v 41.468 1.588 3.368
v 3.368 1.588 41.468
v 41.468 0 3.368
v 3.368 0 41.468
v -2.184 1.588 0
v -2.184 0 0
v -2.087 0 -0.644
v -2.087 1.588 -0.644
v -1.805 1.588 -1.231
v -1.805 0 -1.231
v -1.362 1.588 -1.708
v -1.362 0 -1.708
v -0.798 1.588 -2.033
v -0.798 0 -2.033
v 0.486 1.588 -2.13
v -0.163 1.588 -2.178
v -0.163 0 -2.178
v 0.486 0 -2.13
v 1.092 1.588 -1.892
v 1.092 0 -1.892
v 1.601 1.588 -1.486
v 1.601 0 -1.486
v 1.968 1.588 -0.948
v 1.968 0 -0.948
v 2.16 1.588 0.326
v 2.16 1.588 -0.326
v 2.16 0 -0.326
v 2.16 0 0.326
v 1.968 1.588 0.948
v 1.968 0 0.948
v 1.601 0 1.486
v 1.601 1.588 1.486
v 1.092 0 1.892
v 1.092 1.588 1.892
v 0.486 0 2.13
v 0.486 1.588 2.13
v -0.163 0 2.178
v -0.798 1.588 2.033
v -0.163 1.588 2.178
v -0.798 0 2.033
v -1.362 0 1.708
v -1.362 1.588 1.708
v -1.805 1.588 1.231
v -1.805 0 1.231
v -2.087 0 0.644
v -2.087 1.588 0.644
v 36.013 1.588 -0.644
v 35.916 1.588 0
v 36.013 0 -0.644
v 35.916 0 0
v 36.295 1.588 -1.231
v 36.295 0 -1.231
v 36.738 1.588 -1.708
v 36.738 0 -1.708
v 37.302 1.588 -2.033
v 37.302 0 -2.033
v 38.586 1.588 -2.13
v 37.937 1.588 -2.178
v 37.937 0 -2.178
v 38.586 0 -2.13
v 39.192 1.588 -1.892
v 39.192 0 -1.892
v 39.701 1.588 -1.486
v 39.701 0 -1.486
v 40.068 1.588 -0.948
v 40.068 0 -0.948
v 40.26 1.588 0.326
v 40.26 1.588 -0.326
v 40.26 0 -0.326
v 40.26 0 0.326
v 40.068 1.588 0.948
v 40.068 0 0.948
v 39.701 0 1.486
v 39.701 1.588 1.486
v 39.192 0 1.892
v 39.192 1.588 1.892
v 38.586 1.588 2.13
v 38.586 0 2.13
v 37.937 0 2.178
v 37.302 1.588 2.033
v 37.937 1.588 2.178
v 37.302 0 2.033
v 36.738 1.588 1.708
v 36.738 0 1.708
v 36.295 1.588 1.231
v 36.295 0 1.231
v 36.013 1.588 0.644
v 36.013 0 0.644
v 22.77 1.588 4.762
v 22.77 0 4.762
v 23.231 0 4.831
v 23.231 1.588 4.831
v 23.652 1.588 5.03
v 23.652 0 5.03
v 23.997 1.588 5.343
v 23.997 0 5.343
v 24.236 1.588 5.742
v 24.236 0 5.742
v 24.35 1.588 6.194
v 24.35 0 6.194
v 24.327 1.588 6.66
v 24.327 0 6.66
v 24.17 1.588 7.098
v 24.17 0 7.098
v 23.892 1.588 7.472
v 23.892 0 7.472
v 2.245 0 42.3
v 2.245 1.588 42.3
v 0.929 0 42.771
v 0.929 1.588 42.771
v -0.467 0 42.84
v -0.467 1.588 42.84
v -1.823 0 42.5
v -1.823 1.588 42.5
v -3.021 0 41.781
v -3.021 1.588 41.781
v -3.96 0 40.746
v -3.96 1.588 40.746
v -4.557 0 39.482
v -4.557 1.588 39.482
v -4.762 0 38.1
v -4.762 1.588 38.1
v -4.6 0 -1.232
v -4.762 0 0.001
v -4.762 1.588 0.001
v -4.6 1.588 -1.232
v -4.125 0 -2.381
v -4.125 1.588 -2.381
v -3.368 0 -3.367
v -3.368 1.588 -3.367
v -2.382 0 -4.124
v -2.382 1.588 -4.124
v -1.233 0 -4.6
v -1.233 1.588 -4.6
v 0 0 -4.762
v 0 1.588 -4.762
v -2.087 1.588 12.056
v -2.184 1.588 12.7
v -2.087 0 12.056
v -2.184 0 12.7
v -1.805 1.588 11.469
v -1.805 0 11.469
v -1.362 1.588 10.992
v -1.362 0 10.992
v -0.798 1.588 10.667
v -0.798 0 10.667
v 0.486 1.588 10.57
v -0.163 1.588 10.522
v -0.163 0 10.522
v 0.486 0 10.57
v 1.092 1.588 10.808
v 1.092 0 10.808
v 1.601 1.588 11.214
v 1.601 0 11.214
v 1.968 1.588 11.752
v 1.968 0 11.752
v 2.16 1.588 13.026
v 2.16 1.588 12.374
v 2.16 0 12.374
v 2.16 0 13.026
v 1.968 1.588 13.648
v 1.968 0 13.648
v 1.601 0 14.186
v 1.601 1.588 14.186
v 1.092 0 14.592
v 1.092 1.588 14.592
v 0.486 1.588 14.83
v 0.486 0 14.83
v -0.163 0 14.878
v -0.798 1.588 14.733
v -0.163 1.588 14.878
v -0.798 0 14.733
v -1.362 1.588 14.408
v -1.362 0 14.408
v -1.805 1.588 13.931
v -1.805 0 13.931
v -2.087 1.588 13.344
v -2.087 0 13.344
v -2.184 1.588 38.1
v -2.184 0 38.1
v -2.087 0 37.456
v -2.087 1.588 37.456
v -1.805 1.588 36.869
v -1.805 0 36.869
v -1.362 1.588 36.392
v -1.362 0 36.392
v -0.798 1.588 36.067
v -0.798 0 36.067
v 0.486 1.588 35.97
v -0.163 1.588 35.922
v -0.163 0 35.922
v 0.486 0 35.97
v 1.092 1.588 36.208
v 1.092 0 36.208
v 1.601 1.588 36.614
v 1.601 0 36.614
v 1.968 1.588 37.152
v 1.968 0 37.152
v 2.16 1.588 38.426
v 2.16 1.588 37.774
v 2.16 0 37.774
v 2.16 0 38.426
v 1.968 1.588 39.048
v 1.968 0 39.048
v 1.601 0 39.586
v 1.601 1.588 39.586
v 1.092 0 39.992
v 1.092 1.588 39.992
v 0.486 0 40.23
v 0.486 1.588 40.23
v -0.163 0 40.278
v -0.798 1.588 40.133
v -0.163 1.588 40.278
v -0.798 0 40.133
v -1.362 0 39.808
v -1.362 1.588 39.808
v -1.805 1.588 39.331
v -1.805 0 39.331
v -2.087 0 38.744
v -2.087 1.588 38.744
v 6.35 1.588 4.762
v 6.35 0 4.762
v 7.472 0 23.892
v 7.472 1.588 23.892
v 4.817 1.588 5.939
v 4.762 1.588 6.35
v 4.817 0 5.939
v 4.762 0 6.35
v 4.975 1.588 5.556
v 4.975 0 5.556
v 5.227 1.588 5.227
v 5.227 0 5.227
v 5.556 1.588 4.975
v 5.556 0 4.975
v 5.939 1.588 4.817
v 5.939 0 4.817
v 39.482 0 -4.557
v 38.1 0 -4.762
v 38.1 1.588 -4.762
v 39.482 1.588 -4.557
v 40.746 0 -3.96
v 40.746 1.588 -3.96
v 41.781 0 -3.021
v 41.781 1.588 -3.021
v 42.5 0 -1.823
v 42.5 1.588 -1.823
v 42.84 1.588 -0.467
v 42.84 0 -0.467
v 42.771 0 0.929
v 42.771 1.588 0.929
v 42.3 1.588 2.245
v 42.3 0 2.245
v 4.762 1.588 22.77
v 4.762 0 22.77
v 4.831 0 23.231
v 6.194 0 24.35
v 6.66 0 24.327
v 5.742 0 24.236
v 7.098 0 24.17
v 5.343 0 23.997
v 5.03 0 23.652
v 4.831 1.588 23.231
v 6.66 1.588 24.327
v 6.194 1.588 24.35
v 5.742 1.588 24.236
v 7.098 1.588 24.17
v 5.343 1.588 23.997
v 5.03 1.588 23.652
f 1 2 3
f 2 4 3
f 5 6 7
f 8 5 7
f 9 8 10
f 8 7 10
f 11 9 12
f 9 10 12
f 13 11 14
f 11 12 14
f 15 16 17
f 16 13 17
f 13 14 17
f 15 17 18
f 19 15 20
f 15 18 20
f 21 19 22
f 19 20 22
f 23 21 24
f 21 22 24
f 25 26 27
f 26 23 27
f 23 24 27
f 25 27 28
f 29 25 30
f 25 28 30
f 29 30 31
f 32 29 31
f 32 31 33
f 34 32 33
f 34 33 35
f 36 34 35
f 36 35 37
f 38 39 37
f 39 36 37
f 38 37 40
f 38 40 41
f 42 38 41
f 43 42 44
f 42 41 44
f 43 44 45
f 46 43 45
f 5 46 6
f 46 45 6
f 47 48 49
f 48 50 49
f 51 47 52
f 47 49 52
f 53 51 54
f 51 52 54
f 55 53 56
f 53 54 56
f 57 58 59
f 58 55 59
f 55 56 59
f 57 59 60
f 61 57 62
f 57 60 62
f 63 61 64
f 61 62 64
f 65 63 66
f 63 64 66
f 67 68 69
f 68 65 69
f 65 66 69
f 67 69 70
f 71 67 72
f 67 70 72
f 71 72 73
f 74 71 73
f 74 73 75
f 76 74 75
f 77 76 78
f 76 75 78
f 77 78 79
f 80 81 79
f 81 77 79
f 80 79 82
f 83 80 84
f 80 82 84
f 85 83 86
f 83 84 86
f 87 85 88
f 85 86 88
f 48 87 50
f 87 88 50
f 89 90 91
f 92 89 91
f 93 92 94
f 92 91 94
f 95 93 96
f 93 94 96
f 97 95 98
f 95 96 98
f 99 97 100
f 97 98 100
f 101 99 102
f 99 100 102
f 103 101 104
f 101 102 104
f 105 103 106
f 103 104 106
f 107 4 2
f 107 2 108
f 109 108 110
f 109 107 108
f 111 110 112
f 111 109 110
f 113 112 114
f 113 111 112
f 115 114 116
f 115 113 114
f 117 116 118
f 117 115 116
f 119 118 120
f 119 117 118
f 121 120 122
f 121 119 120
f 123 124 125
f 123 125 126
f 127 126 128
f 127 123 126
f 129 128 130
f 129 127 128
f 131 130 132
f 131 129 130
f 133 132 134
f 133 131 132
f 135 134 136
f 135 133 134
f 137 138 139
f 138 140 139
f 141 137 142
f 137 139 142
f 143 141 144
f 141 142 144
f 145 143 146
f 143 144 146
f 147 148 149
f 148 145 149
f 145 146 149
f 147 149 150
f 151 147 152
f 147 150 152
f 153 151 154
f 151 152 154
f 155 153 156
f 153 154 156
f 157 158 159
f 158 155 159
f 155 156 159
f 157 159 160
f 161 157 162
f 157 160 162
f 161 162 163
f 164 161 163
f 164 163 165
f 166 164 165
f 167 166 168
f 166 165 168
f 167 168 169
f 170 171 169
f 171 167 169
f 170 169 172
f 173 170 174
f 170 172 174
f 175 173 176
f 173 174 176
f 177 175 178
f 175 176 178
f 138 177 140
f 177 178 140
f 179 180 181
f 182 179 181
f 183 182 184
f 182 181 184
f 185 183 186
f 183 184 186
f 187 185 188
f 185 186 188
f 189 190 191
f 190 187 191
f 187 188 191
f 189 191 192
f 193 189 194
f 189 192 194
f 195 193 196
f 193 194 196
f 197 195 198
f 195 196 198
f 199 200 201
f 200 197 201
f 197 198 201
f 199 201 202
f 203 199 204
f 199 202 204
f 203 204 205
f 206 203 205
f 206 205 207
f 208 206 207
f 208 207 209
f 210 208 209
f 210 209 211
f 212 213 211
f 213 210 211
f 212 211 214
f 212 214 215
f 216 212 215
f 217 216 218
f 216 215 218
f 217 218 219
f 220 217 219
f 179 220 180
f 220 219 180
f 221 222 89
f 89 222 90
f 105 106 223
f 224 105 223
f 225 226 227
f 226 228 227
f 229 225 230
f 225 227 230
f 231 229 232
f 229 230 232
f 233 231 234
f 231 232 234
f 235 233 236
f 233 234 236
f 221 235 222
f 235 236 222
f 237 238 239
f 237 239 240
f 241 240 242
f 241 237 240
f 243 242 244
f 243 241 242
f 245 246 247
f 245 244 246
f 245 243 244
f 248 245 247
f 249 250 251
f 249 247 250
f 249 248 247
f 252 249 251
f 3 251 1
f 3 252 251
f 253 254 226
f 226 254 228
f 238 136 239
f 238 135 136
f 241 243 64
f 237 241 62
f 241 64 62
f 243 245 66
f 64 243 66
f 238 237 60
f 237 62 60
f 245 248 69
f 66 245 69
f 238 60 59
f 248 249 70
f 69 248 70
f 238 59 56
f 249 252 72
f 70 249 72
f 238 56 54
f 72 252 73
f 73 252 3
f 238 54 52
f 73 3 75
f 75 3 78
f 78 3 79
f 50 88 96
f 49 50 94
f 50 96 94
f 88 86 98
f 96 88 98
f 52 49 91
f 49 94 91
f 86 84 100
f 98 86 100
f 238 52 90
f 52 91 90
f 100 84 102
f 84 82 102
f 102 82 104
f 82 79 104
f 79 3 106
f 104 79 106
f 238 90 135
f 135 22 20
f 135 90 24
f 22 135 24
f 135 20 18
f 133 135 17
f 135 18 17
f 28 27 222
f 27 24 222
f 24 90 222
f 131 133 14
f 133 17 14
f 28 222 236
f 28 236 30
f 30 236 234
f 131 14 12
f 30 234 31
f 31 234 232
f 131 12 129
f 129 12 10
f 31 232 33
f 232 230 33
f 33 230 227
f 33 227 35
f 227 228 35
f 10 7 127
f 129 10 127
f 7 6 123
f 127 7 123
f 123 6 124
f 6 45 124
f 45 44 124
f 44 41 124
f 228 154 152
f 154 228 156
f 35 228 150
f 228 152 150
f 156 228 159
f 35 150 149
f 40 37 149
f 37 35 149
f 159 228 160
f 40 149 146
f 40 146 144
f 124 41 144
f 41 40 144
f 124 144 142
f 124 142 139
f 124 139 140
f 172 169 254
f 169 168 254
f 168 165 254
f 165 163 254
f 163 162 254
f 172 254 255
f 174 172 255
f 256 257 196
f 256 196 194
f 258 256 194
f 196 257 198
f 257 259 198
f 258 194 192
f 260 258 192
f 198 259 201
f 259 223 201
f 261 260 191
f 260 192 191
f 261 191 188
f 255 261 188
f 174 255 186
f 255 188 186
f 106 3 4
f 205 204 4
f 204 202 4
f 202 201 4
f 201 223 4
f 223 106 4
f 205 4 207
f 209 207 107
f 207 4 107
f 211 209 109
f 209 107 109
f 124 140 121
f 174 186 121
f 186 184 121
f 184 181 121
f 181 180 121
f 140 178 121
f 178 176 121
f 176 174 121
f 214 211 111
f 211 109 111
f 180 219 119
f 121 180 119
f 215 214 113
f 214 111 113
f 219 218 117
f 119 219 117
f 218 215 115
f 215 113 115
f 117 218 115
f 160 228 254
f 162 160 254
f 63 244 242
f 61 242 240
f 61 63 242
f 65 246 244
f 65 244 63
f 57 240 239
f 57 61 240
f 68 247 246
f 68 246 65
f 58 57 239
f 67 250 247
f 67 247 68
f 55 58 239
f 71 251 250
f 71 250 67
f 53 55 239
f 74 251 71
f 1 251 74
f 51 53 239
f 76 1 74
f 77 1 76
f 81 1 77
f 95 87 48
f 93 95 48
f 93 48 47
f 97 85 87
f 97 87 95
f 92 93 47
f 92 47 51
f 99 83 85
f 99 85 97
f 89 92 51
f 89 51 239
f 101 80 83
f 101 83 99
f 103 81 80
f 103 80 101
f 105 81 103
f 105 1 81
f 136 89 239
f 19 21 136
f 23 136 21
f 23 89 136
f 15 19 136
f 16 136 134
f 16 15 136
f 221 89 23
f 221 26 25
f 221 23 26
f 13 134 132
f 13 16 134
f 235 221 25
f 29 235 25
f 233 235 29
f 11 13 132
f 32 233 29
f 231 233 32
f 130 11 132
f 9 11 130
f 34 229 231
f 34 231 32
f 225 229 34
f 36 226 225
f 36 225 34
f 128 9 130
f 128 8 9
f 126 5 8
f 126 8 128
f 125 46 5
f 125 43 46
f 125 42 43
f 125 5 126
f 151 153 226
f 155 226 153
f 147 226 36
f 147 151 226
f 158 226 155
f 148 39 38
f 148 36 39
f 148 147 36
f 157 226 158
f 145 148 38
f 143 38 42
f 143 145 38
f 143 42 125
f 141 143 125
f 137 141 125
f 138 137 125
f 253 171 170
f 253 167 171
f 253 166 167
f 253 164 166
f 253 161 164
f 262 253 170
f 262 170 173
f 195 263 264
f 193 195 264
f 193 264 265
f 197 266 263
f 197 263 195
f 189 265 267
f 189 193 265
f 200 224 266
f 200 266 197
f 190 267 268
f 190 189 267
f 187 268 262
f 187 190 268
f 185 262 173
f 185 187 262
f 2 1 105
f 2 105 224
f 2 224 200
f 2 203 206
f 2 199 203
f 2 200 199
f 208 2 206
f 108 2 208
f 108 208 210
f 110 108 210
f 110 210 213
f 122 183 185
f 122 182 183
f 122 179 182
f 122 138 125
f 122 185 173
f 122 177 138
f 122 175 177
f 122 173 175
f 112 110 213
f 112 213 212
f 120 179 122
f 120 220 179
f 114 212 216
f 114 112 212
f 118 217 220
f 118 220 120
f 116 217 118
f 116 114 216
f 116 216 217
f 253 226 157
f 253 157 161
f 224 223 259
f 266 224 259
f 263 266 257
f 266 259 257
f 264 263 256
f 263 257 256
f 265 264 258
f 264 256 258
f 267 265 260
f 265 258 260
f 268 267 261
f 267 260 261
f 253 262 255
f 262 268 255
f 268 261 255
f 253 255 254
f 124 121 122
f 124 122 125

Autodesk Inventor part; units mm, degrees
ref_plane "YZ Plane" through (0, 0, 0) normal (1, 0, 0) x (0, 1, 0)
ref_plane "XZ Plane" through (0, 0, 0) normal (0, 1, 0) x (-1, 0, 0)
ref_plane "XY Plane" through (0, 0, 0) normal (0, 0, 1) x (1, 0, 0)
sketch "main" plane through (0, 0, 0) normal (0, 0, 1) x (1, 0, 0)
  circle A0 centre (19.7324, 21.1672) radius 2.1844
  circle A1 centre (19.7324, -16.9328) radius 2.1844
  circle A2 centre (-18.3676, -16.9328) radius 2.1844
  arc A3 (24.4949, 21.1672) -> (16.3648, 24.5348) centre (19.7324, 21.1672) ccw
  arc A4 (-21.7352, -13.5652) -> (-18.3676, -21.6953) centre (-18.3676, -16.9328) ccw
  arc A5 (19.7324, -21.6953) -> (24.4949, -16.9317) centre (19.7324, -16.9328) ccw
  line L0 (19.7324, -21.6953) -> (-18.3676, -21.6953)
  line L1 (24.4949, 21.1672) -> (24.4949, -16.9317)
  line L2 (16.3648, 24.5348) -> (-21.7352, -13.5652)
  line L3 (13.3824, -12.1703) -> (-3.0373, -12.1703)
  line L4 (-4.1599, -9.4602) -> (12.2599, 6.9595)
  line L5 (14.9699, 5.837) -> (14.9699, -10.5828)
  arc A6 (13.3824, -12.1703) -> (14.9699, -10.5828) centre (13.3824, -10.5828) ccw
  arc A7 (14.9699, 5.837) -> (12.2599, 6.9595) centre (13.3824, 5.837) ccw
  arc A8 (-4.1599, -9.4602) -> (-3.0373, -12.1703) centre (-3.0373, -10.5828) ccw
  circle A9 centre (19.7324, -4.2328) radius 2.1844
  point P0 (6.6792, -3.8964)
  dimension "d0" = 9.525
  dimension "d1" = 9.525
  dimension "d2" = 9.525
  dimension "d5" = 9.525
  dimension "d6" = 1.5875
  dimension "d7" = 1.5875
  dimension "d11" = 4.3688
sketch "Sketch1" plane through (0, 0, 0) normal (0, 1, 0) x (-1, 0, 0)
  circle A0 centre (0, 38.1) radius 2.1844
  circle A1 centre (0, 0) radius 2.1844
  circle A2 centre (-38.1, 0) radius 2.1844
  arc A3 (4.7625, 38.1) -> (-3.3676, 41.4676) centre (0, 38.1) ccw
  arc A4 (-41.4676, 3.3676) -> (-38.1, -4.7625) centre (-38.1, 0) ccw
  arc A5 (0, -4.7625) -> (4.7625, 0.0011) centre (0, 0) ccw
  line L0 (0, -4.7625) -> (-38.1, -4.7625)
  line L1 (4.7625, 38.1) -> (4.7625, 0.0011)
  line L2 (-3.3676, 41.4676) -> (-41.4676, 3.3676)
  line L3 (-6.35, 4.7625) -> (-22.7697, 4.7625)
  line L4 (-23.8923, 7.4725) -> (-7.4725, 23.8923)
  line L5 (-4.7625, 22.7697) -> (-4.7625, 6.35)
  arc A6 (-6.35, 4.7625) -> (-4.7625, 6.35) centre (-6.35, 6.35) ccw
  arc A7 (-4.7625, 22.7697) -> (-7.4725, 23.8923) centre (-6.35, 22.7697) ccw
  arc A8 (-23.8923, 7.4725) -> (-22.7697, 4.7625) centre (-22.7697, 6.35) ccw
  circle A9 centre (0, 12.7) radius 2.1844
extrude "Extrusion1" add sketch "Sketch1" along normal blind 1.5875
properties part number "right_angle_gusset" material "Acetal Resin, White"
